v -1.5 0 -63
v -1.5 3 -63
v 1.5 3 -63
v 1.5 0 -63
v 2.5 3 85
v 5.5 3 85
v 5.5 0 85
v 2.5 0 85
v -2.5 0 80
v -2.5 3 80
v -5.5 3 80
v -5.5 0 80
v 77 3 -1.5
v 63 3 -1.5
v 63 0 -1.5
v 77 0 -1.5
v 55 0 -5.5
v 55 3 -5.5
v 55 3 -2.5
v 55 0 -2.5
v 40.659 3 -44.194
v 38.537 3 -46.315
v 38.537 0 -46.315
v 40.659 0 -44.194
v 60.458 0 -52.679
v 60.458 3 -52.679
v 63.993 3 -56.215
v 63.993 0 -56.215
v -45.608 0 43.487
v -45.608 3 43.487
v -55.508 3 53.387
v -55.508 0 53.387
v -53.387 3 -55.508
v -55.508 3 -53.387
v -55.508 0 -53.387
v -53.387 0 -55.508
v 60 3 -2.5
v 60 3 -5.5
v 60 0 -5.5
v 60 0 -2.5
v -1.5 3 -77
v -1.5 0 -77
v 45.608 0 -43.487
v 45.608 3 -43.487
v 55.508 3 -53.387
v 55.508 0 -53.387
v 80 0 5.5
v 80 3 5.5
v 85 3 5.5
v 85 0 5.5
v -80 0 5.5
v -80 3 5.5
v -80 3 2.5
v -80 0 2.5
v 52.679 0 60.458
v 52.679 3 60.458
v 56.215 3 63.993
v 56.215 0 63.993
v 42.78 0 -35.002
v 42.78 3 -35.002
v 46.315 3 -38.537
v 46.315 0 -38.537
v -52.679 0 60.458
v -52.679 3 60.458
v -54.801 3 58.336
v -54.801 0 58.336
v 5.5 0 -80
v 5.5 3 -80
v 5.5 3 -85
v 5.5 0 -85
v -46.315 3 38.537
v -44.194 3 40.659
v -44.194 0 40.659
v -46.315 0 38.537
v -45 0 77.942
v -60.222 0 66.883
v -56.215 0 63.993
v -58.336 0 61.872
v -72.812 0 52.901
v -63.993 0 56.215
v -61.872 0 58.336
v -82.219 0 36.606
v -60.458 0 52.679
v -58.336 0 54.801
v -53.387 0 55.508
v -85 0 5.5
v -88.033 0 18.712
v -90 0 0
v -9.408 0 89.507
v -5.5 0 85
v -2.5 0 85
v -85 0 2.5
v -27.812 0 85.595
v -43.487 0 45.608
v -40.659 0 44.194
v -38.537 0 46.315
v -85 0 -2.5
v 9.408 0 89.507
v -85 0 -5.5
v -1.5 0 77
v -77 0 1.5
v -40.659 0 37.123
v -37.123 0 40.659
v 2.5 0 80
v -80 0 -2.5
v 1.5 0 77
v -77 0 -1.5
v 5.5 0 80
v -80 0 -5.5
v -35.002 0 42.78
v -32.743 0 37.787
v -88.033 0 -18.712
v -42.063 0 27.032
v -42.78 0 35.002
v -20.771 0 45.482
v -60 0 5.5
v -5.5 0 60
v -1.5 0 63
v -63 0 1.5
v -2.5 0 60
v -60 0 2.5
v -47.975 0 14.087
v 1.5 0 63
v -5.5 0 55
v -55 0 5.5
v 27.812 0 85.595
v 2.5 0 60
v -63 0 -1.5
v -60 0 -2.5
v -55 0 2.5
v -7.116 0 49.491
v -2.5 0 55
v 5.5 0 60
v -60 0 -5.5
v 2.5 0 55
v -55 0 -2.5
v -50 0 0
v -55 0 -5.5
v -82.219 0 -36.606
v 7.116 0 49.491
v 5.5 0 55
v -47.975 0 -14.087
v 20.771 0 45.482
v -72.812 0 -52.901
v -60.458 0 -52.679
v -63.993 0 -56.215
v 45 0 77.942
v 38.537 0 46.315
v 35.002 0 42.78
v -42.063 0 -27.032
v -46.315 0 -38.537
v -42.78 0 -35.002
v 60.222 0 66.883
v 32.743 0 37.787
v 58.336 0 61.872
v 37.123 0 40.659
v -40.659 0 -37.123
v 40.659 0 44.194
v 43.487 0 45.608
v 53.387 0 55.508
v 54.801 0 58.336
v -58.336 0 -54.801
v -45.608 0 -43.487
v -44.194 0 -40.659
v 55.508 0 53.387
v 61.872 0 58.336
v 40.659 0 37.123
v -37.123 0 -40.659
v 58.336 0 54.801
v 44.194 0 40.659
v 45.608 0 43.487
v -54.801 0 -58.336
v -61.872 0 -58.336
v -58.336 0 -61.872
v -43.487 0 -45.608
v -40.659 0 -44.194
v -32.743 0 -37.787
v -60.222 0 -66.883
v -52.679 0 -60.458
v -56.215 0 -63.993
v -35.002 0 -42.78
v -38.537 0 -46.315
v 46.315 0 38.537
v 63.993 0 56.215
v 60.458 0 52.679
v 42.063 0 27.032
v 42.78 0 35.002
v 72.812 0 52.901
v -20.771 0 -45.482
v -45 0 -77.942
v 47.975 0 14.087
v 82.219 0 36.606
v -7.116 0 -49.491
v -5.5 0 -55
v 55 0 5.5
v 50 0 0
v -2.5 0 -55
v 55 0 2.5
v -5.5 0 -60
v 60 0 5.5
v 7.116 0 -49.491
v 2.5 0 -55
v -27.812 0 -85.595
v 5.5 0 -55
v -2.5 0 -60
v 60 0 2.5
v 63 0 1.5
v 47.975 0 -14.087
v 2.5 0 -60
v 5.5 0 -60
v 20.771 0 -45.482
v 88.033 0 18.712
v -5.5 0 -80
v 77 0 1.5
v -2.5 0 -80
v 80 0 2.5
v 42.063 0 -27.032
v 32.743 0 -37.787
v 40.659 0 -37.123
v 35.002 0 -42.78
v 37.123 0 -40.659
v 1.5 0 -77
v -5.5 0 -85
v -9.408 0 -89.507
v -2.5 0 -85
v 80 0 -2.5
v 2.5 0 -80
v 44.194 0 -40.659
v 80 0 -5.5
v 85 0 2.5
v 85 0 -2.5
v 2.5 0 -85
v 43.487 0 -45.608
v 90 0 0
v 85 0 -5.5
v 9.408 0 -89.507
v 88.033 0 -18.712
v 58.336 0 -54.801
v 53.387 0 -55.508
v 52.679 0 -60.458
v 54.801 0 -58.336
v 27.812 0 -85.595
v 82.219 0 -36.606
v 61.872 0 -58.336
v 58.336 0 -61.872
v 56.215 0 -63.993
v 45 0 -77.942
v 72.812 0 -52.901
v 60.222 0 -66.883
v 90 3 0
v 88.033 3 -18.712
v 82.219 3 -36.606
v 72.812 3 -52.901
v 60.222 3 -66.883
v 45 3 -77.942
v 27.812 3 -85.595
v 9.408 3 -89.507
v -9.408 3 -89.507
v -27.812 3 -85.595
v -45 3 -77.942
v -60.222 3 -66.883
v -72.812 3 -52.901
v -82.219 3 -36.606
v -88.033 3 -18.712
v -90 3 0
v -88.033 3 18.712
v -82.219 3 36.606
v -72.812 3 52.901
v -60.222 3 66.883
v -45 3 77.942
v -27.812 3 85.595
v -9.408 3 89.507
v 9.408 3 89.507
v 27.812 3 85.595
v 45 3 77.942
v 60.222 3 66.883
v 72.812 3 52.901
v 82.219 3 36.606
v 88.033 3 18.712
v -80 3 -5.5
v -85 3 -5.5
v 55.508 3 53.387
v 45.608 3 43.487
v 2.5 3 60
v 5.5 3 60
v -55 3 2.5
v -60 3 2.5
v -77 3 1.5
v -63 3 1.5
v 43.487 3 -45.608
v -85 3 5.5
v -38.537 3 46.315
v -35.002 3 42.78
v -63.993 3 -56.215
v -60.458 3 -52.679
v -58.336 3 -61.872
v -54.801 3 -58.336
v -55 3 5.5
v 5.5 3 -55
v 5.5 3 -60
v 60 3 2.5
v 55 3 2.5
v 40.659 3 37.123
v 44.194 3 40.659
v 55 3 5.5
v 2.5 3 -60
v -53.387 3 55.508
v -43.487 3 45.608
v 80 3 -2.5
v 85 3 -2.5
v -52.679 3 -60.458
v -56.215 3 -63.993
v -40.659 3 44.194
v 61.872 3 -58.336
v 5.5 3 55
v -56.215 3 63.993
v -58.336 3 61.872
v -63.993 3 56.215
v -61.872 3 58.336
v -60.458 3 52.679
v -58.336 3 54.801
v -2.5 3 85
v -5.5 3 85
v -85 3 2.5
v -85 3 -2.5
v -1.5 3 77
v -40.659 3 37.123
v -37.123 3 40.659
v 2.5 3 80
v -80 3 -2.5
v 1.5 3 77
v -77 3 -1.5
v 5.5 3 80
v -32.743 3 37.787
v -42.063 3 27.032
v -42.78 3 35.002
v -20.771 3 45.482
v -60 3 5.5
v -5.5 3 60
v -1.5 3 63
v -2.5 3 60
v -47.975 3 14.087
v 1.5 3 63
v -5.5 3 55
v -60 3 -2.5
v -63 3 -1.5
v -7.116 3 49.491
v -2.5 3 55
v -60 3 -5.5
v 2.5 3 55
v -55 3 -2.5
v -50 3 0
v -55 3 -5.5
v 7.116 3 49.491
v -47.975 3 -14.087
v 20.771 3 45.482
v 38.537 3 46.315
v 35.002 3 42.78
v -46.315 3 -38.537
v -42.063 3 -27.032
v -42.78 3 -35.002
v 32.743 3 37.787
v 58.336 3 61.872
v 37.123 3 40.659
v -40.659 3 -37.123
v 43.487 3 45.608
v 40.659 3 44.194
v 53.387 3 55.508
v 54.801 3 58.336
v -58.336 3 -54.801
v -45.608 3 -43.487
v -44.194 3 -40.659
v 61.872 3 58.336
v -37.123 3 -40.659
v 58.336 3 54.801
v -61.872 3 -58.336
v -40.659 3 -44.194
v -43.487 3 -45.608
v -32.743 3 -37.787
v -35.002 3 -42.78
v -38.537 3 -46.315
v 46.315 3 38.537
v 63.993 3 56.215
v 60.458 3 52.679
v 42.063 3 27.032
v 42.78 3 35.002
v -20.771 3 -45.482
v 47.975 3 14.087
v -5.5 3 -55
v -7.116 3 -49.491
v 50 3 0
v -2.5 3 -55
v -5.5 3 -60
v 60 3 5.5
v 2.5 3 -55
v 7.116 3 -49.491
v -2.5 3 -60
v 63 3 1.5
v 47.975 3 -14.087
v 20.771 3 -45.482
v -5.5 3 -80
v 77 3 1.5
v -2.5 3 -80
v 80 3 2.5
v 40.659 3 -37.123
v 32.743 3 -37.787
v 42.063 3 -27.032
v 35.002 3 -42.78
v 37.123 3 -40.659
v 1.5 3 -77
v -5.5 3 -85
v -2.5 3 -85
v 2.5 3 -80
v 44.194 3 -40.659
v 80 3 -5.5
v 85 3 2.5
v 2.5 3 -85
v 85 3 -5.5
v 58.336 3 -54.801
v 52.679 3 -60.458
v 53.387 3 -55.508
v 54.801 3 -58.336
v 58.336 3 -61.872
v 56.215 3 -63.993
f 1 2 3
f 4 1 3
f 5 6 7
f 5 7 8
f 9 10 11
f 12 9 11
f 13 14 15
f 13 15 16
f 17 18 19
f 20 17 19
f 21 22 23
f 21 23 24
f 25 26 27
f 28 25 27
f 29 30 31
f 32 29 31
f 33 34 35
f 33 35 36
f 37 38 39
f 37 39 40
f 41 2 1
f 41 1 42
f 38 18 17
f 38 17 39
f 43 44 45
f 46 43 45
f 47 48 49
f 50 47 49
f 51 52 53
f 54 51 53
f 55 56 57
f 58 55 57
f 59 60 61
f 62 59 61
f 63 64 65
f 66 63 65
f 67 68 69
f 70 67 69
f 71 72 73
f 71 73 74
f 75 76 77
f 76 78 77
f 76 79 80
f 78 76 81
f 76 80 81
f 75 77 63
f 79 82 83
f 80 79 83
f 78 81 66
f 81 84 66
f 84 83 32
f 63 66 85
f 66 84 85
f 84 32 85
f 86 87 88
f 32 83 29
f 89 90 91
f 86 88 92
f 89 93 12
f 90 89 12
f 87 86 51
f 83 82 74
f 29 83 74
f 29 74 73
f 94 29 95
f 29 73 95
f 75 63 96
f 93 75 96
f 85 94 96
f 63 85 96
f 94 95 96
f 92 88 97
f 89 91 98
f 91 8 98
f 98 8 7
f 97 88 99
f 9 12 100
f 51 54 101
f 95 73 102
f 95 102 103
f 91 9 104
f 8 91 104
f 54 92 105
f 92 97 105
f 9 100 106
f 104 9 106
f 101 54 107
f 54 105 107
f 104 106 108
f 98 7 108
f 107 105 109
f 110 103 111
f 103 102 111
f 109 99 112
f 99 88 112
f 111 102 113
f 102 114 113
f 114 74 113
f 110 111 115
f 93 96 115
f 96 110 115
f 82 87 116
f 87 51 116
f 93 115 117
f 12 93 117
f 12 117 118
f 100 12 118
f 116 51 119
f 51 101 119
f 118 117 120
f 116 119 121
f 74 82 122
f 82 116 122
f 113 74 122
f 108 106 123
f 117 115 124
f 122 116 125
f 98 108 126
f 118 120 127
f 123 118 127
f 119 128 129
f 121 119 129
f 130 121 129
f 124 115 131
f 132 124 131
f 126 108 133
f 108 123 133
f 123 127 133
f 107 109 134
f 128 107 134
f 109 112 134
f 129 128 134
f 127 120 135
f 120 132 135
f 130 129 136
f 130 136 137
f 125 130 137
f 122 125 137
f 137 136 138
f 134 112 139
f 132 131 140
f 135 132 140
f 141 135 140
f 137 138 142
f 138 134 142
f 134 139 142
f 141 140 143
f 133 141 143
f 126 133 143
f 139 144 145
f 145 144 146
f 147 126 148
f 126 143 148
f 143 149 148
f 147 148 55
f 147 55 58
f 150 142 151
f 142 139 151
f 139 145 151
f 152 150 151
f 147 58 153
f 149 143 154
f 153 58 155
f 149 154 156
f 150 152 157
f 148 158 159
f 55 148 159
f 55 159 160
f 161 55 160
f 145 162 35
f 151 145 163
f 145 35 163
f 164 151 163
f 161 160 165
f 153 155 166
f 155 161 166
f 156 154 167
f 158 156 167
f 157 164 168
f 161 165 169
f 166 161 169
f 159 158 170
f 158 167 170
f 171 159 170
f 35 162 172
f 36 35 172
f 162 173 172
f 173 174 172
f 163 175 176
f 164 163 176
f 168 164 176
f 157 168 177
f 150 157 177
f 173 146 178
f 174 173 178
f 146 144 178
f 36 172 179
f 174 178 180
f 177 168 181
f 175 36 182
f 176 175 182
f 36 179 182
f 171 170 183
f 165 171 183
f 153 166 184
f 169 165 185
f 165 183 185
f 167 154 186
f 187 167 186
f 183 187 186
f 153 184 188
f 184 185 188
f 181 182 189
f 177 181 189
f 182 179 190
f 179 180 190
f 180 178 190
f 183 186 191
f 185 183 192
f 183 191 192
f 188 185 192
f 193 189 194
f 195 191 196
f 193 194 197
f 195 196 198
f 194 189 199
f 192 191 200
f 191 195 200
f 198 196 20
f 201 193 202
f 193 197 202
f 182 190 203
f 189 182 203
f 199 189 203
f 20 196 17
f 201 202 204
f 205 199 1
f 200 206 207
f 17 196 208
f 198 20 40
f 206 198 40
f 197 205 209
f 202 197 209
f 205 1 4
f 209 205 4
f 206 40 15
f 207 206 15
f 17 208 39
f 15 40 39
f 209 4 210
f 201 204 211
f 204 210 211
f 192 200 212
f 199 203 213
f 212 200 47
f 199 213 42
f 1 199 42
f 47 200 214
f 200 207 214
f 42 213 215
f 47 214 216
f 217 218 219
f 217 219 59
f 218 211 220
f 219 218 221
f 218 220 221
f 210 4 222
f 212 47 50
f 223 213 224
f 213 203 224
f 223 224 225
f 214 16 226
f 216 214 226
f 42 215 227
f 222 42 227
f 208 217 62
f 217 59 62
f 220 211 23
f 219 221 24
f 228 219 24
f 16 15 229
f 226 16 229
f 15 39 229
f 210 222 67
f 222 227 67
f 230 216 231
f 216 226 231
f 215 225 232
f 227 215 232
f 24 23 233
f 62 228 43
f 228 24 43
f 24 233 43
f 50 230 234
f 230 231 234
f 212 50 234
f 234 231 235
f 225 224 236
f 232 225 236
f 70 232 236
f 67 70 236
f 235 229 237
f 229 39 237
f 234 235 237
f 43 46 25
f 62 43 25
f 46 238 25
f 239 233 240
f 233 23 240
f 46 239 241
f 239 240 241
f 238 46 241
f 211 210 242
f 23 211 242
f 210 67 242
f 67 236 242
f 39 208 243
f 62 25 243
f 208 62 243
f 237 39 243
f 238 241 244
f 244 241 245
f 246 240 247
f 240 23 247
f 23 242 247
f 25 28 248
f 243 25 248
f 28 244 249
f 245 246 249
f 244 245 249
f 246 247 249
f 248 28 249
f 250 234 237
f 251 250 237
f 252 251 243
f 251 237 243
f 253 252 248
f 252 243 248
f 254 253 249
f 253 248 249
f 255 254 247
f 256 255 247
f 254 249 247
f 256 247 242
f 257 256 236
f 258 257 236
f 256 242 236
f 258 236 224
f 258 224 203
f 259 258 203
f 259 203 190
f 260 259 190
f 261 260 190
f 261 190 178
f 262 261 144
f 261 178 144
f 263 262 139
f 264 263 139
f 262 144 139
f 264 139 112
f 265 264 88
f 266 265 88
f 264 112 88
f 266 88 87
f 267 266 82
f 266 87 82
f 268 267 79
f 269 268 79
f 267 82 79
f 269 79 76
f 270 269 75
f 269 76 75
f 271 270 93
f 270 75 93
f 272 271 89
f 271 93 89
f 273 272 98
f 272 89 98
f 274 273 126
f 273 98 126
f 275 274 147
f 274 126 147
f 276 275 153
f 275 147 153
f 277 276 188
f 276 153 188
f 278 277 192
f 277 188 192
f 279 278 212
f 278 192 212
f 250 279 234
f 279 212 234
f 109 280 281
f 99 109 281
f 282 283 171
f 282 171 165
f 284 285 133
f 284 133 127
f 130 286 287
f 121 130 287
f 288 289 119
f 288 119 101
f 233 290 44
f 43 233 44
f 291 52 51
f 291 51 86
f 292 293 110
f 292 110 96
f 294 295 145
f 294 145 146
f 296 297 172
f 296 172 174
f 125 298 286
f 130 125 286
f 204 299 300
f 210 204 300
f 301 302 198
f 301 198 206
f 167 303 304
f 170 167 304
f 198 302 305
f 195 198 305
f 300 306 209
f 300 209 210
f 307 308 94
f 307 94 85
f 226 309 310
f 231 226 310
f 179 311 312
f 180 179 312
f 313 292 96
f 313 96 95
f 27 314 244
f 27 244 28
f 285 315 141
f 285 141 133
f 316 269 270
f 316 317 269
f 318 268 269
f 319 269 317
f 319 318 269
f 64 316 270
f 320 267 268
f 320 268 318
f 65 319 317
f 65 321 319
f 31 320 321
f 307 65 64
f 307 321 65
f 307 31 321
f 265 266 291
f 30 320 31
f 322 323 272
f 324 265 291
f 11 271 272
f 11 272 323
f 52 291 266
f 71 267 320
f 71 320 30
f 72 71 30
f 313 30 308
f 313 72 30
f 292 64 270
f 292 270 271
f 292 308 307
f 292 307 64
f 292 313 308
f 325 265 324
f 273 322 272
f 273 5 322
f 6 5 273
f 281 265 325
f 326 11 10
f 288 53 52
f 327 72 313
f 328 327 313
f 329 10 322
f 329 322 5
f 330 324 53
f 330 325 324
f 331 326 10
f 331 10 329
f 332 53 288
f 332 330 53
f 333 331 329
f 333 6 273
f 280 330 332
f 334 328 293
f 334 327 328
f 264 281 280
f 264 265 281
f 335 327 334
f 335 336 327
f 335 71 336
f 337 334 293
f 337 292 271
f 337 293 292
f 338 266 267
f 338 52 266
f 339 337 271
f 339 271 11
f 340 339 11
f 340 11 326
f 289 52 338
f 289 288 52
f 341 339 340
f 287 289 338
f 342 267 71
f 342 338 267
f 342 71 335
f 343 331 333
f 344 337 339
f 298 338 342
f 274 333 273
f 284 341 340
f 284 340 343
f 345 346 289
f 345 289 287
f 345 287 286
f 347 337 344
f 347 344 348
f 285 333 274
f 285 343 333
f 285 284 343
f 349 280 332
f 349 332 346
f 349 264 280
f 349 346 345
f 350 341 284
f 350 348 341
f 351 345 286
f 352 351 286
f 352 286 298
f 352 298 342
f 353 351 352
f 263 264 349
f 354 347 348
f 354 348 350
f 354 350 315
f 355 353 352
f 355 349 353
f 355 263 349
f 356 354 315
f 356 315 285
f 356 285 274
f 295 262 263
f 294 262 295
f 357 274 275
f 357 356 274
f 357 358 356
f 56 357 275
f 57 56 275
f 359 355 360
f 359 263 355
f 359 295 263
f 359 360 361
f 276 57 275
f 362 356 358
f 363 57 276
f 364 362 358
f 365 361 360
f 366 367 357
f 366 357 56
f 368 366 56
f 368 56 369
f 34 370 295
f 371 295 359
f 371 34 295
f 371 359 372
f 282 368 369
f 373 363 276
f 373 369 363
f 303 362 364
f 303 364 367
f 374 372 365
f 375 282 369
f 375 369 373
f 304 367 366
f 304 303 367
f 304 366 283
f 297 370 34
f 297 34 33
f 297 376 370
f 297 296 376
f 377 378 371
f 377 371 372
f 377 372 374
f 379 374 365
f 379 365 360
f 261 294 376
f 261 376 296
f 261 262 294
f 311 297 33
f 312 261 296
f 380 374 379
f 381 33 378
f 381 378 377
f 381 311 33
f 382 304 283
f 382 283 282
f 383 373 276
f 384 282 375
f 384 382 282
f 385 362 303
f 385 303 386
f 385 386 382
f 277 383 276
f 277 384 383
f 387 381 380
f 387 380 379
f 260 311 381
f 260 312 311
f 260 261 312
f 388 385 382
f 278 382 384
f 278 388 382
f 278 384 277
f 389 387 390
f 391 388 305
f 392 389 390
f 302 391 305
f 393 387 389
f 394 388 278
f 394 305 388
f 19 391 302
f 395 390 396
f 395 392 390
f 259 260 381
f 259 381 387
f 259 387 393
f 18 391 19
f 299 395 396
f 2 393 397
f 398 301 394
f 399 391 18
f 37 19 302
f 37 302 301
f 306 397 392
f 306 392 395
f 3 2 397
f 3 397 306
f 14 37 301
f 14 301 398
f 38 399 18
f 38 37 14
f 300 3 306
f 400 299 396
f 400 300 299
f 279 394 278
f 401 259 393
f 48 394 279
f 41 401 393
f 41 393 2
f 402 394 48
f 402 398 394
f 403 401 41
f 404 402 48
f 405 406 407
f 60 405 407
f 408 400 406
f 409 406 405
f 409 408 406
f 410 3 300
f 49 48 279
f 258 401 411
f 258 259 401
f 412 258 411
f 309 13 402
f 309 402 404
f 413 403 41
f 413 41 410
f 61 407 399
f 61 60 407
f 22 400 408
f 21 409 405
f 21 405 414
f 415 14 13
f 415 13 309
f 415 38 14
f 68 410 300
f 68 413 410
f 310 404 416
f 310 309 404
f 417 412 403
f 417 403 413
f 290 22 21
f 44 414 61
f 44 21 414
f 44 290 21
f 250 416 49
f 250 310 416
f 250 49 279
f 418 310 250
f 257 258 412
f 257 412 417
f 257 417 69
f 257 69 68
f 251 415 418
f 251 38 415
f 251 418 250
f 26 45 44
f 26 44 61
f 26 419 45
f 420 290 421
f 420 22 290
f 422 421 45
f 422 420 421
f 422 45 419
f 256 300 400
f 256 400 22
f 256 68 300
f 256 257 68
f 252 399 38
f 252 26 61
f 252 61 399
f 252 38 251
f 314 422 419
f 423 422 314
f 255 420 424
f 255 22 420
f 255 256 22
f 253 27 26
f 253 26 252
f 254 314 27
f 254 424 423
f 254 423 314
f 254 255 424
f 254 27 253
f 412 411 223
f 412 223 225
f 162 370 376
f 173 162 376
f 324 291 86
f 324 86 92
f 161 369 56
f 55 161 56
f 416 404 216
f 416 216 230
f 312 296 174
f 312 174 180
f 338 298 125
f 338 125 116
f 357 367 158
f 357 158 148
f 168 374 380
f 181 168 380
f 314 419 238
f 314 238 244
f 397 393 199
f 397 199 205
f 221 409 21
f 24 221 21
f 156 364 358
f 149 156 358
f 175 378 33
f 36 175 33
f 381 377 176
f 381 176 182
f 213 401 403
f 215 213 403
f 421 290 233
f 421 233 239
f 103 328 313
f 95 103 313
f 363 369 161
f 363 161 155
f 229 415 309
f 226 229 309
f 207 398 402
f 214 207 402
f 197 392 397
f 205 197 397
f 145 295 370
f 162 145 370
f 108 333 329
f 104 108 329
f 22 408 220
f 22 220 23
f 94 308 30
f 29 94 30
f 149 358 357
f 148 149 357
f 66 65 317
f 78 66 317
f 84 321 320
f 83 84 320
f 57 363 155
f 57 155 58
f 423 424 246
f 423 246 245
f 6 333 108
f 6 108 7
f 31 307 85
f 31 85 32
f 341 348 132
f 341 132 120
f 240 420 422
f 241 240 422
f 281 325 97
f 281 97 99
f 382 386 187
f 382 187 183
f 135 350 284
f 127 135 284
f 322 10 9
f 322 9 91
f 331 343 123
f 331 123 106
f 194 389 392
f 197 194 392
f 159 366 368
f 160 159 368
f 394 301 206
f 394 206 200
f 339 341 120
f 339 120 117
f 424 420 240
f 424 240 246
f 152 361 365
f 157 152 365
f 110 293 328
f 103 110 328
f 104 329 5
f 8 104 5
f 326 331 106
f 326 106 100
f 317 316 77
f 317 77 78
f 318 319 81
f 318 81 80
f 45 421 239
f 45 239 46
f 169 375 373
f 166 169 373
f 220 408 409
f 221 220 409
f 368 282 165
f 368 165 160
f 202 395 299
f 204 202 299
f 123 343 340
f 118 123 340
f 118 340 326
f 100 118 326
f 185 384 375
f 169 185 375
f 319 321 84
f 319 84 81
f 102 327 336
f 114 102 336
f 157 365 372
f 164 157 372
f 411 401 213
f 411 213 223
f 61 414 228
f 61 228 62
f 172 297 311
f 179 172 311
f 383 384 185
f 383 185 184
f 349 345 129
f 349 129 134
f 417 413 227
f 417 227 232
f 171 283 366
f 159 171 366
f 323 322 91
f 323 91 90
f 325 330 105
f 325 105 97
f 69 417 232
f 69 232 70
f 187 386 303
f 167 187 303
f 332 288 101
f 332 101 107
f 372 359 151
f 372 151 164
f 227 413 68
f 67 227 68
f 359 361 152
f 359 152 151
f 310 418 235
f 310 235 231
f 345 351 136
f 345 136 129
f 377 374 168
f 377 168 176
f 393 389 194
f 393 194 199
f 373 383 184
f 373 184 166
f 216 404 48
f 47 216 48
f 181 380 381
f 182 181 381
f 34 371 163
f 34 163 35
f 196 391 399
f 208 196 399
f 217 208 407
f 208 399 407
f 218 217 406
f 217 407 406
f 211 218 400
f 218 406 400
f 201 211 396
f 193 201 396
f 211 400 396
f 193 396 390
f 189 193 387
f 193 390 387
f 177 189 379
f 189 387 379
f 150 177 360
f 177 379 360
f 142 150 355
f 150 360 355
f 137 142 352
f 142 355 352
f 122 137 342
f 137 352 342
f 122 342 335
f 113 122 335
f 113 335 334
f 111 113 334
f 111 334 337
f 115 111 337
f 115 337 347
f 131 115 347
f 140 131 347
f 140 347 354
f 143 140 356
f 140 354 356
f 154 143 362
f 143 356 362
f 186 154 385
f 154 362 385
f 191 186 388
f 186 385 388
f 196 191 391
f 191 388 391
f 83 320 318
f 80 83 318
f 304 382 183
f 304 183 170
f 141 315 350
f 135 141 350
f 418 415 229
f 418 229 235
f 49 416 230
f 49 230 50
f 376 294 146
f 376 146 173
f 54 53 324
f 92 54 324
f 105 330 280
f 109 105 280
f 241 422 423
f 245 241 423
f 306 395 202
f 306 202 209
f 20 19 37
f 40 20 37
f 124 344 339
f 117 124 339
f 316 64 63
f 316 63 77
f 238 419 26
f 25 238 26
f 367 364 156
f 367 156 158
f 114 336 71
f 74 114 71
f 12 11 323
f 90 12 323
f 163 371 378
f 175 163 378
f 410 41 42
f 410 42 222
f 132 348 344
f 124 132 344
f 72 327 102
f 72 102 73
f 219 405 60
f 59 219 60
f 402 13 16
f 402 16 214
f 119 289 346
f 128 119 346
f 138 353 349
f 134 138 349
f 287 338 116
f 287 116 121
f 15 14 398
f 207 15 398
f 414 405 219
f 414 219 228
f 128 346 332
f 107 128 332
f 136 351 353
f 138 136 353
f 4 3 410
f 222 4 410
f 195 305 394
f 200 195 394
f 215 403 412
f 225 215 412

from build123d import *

# Parameters (mm, degrees)
SKETCH1_R           = 90
BOSS_EXTRUDE1_DEPTH = 3
SKETCH2_W           = 3
SKETCH2_H           = 14
CUT_EXTRUDE2_DEPTH  = 3
CIRPATTERN1_COUNT   = 8
SKETCH16_W          = 3
SKETCH16_H          = 5
CUT_EXTRUDE5_DEPTH  = 3
CIRPATTERN2_COUNT   = 8
SKETCH24_R          = 50
CUT_EXTRUDE6_DEPTH  = 3


with BuildPart() as part:
    # Sketch1 → Boss-Extrude1 (new body)
    with BuildSketch(Plane(origin=(0, 0, 0), x_dir=(1, 0, 0), z_dir=(0, 1, 0))):
        Circle(SKETCH1_R)
    extrude(amount=BOSS_EXTRUDE1_DEPTH)

    # Sketch2 → Cut-Extrude2 (cut)
    with BuildSketch(Plane(origin=(0, 3, 0), x_dir=(1, 0, 0), z_dir=(0, 1, 0))):
        with Locations((0, 70)):
            Rectangle(SKETCH2_W, SKETCH2_H)
    cut_extrude2 = extrude(amount=-CUT_EXTRUDE2_DEPTH, mode=Mode.SUBTRACT)

    # CirPattern1: Cut-Extrude2 ×8 about axis
    cirpattern1_axis = Axis((0, 0, 0), (0, 1, 0))
    for i in range(1, CIRPATTERN1_COUNT):
        add(cut_extrude2.rotate(cirpattern1_axis, i * 360 / CIRPATTERN1_COUNT), mode=Mode.SUBTRACT)

    # Sketch16 → Cut-Extrude5 (cut)
    with BuildSketch(Plane(origin=(0, 3, 0), x_dir=(1, 0, 0), z_dir=(0, 1, 0))):
        with Locations((-4, 82.5)):
            Rectangle(SKETCH16_W, SKETCH16_H)
        with Locations((4, 82.5)):
            Rectangle(SKETCH16_W, SKETCH16_H)
        with Locations((-4, 57.5)):
            Rectangle(SKETCH16_W, SKETCH16_H)
        with Locations((4, 57.5)):
            Rectangle(SKETCH16_W, SKETCH16_H)
    cut_extrude5 = extrude(amount=-CUT_EXTRUDE5_DEPTH, mode=Mode.SUBTRACT)

    # CirPattern2: Cut-Extrude5 ×8 about axis
    cirpattern2_axis = Axis((0, 0, 0), (0, 1, 0))
    for i in range(1, CIRPATTERN2_COUNT):
        add(cut_extrude5.rotate(cirpattern2_axis, i * 360 / CIRPATTERN2_COUNT), mode=Mode.SUBTRACT)

    # Sketch24 → Cut-Extrude6 (cut)
    with BuildSketch(Plane(origin=(0, 3, 0), x_dir=(1, 0, 0), z_dir=(0, 1, 0))):
        Circle(SKETCH24_R)
    extrude(amount=-CUT_EXTRUDE6_DEPTH, mode=Mode.SUBTRACT)


solid = part.part
